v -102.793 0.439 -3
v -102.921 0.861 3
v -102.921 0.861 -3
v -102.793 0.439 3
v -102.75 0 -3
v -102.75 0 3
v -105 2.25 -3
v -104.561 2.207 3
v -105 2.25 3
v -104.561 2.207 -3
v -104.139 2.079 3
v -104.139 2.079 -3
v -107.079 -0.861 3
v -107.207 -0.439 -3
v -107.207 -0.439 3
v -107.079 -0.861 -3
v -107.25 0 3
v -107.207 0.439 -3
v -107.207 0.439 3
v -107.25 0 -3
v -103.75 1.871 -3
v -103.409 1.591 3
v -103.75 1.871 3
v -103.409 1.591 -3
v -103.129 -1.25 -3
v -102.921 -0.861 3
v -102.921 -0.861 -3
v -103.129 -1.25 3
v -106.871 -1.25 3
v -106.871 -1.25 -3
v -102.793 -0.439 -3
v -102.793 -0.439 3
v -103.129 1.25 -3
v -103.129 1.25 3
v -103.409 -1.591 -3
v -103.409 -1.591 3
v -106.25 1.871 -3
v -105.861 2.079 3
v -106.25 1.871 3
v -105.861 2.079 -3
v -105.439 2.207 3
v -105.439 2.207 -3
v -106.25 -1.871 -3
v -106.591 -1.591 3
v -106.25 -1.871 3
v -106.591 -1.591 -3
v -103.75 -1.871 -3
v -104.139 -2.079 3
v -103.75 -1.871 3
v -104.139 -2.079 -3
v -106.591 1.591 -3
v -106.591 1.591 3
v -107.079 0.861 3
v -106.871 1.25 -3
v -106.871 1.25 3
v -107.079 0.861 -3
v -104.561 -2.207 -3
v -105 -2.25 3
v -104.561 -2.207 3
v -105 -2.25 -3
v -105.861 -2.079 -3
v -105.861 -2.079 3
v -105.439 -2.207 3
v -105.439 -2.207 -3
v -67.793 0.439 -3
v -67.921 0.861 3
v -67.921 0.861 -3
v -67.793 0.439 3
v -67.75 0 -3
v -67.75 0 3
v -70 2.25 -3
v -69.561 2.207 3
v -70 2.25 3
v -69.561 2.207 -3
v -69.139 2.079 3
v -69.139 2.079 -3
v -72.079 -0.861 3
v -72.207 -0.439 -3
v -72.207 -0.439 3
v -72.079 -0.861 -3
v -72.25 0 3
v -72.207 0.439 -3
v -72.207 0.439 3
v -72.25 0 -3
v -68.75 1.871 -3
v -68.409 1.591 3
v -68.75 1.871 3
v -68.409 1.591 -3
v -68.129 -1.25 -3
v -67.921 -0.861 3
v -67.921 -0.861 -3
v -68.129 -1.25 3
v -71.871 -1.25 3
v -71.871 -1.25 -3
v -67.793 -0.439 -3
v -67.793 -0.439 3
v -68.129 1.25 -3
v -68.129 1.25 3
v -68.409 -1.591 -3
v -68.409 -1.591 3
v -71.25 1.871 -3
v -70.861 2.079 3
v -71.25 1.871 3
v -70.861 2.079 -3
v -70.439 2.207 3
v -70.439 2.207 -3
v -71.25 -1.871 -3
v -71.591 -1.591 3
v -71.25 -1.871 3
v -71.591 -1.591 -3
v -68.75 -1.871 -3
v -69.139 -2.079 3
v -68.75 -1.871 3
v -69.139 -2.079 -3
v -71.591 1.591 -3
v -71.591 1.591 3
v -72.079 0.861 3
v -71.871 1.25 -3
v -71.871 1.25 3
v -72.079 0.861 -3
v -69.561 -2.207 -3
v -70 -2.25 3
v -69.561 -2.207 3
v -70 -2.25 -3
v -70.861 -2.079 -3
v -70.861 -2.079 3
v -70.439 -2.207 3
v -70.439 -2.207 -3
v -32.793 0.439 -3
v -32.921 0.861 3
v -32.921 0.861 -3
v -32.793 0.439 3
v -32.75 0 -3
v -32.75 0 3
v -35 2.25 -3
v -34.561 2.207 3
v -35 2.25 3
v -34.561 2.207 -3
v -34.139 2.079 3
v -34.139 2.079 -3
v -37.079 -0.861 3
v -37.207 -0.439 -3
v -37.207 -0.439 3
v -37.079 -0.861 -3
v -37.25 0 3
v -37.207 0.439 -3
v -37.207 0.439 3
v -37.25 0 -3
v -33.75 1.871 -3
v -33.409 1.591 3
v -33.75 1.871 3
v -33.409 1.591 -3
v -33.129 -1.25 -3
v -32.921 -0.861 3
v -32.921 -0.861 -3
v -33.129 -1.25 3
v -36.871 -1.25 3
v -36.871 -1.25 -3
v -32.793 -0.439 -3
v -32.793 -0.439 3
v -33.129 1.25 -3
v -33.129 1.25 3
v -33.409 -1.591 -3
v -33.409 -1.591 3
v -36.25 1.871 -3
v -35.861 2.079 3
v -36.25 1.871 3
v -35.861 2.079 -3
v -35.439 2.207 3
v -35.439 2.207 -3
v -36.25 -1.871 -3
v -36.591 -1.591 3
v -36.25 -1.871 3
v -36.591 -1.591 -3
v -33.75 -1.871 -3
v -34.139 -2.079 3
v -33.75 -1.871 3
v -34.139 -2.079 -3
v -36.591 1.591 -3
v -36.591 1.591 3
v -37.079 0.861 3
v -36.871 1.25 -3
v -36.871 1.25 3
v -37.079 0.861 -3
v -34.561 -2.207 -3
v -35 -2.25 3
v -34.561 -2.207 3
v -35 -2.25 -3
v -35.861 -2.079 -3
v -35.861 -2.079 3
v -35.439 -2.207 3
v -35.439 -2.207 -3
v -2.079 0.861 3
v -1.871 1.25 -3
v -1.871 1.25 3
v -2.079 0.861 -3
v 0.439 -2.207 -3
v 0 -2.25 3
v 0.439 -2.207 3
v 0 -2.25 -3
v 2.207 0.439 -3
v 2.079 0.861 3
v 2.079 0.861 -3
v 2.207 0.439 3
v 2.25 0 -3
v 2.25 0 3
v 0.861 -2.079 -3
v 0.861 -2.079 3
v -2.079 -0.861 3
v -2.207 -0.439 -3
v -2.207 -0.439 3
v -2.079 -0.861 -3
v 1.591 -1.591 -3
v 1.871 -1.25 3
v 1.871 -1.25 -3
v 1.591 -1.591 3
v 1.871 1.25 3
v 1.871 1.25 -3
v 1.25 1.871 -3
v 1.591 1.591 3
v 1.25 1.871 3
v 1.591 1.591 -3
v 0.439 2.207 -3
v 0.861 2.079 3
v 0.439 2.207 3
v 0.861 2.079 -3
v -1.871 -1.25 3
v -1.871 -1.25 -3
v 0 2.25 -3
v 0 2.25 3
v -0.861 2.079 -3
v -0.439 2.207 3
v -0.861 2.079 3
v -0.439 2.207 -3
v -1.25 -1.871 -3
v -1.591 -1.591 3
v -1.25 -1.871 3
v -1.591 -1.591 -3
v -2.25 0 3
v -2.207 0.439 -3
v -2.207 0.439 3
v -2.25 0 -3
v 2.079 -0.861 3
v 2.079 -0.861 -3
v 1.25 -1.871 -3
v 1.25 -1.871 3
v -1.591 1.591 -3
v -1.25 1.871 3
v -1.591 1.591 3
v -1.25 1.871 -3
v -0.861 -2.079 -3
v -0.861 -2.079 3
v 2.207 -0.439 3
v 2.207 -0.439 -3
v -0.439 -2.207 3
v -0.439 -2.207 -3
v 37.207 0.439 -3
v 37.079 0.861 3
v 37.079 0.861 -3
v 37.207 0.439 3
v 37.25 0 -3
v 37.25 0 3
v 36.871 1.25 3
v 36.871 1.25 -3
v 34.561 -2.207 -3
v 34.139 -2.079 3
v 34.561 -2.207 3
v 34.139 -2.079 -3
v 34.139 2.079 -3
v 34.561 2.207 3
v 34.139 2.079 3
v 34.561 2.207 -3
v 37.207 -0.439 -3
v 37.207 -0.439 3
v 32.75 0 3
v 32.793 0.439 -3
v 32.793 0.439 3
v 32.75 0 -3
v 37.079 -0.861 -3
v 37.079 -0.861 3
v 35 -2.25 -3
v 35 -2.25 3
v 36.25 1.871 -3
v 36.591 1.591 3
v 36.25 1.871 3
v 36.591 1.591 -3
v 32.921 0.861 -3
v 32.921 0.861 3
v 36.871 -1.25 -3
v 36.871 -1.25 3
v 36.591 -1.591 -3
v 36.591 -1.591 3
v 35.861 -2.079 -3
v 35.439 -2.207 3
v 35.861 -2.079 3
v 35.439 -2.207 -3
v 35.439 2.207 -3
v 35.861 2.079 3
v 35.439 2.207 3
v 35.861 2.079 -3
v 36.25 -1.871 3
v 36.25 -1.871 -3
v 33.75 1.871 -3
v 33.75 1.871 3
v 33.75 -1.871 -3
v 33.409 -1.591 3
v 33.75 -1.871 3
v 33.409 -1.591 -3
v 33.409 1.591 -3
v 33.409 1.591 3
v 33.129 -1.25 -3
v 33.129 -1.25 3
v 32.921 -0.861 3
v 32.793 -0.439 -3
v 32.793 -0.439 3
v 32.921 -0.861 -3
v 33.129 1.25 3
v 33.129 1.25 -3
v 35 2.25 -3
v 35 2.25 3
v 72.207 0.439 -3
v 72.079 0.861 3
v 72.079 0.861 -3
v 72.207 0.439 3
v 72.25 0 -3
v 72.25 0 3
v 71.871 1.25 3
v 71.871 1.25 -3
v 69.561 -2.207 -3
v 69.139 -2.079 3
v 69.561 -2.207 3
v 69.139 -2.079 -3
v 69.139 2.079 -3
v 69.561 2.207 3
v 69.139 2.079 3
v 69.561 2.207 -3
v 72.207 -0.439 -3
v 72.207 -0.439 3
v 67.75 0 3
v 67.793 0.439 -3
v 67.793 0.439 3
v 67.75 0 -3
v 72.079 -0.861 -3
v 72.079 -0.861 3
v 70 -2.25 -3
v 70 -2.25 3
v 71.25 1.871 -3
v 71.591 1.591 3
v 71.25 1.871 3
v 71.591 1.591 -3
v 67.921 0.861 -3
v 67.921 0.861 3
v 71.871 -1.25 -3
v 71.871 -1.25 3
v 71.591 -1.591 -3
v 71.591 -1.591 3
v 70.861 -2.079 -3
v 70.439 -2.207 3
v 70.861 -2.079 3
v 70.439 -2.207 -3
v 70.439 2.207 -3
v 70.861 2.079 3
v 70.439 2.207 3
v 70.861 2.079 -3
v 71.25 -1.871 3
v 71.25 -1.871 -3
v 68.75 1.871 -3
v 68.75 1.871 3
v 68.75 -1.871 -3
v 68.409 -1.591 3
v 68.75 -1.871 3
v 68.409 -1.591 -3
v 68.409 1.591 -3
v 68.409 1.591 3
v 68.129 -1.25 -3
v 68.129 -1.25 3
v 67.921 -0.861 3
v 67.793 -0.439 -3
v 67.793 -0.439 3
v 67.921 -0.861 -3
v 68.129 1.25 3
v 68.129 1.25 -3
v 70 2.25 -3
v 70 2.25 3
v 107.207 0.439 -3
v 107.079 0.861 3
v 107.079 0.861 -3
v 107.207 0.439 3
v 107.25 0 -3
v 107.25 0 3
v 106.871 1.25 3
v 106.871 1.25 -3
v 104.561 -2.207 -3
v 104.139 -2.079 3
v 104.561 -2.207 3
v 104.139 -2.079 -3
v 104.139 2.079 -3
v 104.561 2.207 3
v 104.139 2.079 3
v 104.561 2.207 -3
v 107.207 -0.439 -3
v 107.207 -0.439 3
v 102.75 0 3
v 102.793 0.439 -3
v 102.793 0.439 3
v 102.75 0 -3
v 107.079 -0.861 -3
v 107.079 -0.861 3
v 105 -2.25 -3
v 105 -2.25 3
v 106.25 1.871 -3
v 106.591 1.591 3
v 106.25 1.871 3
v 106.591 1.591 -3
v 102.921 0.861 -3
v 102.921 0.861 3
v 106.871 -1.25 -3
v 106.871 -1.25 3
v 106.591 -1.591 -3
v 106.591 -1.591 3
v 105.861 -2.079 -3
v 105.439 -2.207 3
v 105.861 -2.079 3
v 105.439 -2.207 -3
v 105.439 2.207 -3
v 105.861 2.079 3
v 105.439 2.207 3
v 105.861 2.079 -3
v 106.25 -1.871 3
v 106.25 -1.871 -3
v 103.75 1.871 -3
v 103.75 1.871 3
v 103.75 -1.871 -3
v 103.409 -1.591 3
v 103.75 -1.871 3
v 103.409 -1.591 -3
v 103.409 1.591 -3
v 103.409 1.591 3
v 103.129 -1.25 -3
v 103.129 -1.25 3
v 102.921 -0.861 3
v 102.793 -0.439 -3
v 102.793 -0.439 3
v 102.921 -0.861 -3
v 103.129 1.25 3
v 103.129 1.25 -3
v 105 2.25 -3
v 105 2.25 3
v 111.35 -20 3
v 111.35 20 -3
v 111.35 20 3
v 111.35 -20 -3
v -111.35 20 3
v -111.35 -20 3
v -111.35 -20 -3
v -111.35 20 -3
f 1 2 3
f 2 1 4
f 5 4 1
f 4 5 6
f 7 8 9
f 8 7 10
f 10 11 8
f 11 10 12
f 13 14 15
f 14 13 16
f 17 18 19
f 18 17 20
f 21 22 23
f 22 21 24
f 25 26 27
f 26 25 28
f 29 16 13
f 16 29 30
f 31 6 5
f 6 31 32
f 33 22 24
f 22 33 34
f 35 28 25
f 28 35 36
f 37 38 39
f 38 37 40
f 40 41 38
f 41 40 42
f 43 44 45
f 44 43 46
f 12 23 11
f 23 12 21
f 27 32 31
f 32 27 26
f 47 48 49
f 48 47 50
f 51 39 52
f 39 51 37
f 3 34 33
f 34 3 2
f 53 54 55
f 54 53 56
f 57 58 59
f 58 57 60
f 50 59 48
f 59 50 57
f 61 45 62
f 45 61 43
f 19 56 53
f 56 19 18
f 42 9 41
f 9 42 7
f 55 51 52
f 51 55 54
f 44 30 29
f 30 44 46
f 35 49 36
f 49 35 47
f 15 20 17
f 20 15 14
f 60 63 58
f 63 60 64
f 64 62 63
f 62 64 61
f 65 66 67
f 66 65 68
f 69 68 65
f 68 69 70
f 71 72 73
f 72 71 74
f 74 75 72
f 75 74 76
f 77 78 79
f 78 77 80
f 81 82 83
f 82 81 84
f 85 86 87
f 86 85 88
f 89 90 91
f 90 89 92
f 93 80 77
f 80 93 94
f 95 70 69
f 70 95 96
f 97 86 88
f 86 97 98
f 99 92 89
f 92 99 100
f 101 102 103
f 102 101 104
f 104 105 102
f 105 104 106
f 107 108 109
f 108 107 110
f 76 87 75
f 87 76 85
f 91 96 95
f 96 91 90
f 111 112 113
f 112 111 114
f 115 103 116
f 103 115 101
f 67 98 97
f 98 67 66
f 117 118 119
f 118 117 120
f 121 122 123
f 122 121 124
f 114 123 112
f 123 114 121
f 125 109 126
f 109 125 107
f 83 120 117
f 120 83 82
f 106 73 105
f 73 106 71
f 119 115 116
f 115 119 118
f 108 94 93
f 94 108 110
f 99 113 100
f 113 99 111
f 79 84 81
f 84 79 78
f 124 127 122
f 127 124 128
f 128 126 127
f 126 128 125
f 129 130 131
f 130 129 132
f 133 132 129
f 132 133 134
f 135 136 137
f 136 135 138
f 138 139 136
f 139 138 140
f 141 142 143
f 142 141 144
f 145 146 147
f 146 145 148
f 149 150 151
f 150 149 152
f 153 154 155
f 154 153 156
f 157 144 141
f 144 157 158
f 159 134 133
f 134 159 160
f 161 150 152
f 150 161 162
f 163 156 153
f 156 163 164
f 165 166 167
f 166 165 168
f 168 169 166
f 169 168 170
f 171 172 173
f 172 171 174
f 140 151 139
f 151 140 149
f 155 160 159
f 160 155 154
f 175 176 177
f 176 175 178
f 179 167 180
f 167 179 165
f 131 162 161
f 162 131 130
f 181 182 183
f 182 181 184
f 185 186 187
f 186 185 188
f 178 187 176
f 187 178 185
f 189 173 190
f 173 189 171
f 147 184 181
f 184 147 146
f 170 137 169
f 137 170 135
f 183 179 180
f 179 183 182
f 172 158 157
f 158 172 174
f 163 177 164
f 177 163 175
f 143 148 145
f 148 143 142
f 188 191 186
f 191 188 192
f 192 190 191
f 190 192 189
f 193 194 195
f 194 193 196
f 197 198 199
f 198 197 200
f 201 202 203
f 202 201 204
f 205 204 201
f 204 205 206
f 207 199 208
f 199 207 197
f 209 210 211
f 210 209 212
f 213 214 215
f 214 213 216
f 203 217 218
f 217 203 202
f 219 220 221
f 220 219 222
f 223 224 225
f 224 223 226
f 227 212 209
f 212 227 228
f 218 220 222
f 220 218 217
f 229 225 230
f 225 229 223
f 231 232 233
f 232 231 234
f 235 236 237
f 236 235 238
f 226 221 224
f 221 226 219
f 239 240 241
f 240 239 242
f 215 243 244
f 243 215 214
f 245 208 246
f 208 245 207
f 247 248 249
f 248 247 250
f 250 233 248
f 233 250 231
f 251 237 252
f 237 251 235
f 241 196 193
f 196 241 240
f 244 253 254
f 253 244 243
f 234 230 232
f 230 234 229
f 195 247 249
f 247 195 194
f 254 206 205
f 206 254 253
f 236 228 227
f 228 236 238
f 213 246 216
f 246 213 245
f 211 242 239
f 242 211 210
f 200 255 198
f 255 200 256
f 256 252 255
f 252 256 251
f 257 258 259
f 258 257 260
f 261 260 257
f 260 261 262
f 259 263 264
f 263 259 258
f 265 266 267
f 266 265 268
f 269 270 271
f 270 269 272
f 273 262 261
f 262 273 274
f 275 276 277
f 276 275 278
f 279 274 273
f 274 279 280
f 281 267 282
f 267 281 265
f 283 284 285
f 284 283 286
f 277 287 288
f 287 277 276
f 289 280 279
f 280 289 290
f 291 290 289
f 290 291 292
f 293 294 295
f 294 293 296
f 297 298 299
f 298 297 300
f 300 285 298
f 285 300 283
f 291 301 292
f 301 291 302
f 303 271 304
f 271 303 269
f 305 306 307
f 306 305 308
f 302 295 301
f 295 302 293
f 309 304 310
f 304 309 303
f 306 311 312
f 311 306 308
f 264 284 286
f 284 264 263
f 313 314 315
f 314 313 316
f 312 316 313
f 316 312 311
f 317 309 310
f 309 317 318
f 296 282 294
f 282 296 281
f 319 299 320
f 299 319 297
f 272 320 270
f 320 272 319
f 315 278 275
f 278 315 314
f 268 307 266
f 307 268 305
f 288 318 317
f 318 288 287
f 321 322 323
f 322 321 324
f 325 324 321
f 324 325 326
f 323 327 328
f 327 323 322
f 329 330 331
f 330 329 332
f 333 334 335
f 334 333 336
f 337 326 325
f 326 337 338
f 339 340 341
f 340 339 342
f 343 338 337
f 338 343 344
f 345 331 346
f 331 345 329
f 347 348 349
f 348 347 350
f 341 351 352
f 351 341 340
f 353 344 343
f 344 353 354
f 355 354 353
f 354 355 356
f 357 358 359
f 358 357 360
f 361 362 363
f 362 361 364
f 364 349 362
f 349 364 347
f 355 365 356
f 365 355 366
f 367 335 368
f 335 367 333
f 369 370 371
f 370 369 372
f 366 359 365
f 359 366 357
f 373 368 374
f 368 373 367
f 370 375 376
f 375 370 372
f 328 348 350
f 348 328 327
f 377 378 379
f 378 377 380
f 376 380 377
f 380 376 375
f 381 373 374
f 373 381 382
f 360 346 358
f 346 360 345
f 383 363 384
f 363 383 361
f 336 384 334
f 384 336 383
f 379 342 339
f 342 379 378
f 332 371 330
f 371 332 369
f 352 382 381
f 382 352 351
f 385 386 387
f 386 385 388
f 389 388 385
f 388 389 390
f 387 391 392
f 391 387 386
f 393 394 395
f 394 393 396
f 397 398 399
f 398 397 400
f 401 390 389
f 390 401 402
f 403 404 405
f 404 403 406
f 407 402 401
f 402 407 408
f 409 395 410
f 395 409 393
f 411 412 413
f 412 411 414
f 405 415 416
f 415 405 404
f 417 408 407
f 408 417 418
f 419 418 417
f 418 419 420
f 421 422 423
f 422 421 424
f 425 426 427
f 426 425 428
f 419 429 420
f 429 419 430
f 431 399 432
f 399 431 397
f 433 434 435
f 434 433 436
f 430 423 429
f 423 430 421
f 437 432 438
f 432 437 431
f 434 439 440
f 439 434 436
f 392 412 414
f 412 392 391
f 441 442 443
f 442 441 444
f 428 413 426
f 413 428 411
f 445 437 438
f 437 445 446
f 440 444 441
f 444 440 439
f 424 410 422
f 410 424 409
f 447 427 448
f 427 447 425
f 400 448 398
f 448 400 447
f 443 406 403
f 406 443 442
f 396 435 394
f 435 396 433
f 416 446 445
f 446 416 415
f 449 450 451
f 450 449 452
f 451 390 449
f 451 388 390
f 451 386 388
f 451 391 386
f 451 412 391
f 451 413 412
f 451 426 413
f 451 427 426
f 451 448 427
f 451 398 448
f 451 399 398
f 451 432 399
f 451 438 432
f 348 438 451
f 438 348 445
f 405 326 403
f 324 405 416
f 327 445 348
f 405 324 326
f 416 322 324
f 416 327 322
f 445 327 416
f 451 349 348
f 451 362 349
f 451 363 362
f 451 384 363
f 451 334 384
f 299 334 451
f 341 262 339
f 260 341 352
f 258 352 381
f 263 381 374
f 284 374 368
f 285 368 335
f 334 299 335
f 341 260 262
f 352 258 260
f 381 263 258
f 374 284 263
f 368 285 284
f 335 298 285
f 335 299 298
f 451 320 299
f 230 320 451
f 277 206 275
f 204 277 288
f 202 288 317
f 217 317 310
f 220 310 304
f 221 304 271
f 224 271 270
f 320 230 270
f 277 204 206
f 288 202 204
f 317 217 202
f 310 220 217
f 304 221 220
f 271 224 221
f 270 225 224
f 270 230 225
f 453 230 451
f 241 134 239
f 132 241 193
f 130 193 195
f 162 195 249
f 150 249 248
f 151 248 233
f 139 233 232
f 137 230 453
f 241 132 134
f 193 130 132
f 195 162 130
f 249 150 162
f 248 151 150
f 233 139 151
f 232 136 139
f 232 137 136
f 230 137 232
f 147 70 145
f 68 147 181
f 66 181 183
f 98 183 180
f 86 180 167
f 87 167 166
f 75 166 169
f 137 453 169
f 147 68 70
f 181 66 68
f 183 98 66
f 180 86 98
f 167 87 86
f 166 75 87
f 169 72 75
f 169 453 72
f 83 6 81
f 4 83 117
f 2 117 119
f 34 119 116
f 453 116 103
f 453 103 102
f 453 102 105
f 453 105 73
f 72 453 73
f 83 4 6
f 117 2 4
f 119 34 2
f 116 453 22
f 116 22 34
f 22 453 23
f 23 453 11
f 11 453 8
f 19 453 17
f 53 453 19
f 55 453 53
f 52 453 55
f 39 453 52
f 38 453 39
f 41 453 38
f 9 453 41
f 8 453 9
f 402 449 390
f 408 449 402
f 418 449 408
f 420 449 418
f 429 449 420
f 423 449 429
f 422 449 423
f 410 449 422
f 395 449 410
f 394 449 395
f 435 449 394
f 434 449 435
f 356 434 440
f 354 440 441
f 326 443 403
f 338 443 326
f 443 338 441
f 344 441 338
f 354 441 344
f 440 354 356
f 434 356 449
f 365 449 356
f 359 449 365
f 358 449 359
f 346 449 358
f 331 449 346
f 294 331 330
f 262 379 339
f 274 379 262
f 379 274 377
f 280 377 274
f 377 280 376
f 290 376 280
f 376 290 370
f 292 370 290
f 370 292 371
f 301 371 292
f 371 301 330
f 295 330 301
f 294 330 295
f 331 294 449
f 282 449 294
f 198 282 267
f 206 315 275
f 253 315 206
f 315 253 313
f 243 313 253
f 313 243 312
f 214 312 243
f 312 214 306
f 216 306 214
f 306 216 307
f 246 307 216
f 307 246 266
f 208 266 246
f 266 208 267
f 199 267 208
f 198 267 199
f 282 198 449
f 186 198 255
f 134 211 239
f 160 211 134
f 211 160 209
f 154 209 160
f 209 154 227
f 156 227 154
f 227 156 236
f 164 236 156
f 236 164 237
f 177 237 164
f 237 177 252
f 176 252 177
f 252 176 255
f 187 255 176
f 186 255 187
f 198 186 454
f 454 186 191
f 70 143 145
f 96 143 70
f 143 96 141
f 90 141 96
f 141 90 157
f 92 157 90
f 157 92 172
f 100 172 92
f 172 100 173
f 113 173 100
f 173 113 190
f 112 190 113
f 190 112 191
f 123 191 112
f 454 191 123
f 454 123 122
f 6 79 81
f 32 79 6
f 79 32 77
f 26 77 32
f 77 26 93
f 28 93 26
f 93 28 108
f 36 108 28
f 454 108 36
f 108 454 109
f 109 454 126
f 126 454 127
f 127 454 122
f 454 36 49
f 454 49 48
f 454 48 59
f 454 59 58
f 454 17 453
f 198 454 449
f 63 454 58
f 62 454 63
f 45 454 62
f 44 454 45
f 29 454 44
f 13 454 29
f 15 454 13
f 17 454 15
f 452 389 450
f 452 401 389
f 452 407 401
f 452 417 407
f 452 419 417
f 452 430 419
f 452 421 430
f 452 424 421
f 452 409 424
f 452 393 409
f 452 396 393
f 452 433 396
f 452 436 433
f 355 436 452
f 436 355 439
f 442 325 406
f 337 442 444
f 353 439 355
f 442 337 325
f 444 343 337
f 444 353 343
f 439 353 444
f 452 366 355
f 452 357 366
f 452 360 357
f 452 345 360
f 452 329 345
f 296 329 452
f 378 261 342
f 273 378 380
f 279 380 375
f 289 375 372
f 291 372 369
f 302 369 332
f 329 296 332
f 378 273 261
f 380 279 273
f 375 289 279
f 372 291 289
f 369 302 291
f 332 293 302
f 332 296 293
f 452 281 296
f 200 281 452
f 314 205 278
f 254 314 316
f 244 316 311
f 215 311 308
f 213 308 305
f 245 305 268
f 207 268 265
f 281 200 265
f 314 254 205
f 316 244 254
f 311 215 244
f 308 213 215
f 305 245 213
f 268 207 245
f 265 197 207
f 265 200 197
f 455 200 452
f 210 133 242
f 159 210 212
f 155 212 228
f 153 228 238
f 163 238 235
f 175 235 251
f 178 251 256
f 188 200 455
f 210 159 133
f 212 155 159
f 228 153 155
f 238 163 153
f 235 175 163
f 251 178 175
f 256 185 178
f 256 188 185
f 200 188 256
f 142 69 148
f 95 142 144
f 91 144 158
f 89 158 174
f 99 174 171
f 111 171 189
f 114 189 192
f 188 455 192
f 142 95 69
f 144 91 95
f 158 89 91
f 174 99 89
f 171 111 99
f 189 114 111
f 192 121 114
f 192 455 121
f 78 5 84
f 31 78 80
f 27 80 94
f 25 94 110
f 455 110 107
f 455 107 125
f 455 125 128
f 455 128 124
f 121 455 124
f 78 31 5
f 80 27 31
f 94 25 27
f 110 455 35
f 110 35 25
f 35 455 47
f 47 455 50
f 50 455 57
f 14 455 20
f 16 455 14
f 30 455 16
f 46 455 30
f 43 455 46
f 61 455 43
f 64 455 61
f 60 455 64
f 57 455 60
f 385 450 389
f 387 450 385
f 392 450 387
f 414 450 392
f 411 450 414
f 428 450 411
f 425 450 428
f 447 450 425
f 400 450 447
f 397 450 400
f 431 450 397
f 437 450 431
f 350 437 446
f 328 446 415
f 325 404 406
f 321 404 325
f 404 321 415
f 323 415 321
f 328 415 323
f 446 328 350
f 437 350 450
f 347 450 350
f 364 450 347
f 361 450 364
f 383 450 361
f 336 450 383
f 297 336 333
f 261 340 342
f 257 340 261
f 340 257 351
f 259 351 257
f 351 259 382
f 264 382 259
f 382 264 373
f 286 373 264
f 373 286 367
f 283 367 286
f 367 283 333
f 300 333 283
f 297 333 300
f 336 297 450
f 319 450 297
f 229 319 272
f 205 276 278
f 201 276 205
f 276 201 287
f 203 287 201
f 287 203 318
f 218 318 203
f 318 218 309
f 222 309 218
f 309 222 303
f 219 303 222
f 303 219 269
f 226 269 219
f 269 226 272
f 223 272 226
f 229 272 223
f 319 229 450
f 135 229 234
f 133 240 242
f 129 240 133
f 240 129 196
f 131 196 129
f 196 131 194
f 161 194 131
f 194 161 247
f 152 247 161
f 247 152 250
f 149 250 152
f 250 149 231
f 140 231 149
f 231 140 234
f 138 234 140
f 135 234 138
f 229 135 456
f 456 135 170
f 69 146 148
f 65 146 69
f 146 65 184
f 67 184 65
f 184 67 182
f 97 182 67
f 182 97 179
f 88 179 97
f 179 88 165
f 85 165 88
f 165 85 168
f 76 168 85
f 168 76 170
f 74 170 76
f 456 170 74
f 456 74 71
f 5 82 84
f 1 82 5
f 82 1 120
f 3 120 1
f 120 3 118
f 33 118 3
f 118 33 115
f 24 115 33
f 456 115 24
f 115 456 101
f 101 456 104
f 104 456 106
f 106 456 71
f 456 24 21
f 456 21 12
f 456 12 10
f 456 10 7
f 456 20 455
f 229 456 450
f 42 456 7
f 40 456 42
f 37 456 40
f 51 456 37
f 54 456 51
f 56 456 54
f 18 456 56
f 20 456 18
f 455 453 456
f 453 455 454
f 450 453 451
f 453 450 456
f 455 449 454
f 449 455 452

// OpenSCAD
$fn = 32;

// ----------------------------------------------------------------------
// Hole bar, 7 x Ø4.5
// skip layout, 6.35 mm edge offset
// ----------------------------------------------------------------------

// --- parameters (mm) ---
bar_w = 40;         // bar width (Y)
bar_t = 6;          // bar thickness (Z)
holes = 7;          // holes per row
hole_d = 4.5;       // hole diameter
edge = 6.35;        // offset from the bar end to the first hole
grid_pitch = 17.5;  // grid the bar was laid out on

// --- derived feature positions (mm) ---
pitch = grid_pitch * 2;       // = 35   holes sit every other grid slot
span = (holes - 1) * pitch;   // = 210   distance between the end holes
bar_l = span + 2 * edge;      // = 222.7   overall bar length
start_x = -bar_l / 2 + edge;  // = -105   X of the first hole
feature_centers = [
  [start_x + 0 * pitch, 0],
  [start_x + 1 * pitch, 0],
  [start_x + 2 * pitch, 0],
  [start_x + 3 * pitch, 0],
  [start_x + 4 * pitch, 0],
  [start_x + 5 * pitch, 0],
  [start_x + 6 * pitch, 0]
];   // hole centres of the first row

// bar with one row of holes, drilled from feature_centers
difference() {
  translate([-bar_l / 2, -bar_w / 2, -bar_t / 2]) cube([bar_l, bar_w, bar_t]);
  for (centre = feature_centers)
    translate([centre[0], centre[1], 0])
      cylinder(d = hole_d, h = bar_t + 2, center = true);
}
